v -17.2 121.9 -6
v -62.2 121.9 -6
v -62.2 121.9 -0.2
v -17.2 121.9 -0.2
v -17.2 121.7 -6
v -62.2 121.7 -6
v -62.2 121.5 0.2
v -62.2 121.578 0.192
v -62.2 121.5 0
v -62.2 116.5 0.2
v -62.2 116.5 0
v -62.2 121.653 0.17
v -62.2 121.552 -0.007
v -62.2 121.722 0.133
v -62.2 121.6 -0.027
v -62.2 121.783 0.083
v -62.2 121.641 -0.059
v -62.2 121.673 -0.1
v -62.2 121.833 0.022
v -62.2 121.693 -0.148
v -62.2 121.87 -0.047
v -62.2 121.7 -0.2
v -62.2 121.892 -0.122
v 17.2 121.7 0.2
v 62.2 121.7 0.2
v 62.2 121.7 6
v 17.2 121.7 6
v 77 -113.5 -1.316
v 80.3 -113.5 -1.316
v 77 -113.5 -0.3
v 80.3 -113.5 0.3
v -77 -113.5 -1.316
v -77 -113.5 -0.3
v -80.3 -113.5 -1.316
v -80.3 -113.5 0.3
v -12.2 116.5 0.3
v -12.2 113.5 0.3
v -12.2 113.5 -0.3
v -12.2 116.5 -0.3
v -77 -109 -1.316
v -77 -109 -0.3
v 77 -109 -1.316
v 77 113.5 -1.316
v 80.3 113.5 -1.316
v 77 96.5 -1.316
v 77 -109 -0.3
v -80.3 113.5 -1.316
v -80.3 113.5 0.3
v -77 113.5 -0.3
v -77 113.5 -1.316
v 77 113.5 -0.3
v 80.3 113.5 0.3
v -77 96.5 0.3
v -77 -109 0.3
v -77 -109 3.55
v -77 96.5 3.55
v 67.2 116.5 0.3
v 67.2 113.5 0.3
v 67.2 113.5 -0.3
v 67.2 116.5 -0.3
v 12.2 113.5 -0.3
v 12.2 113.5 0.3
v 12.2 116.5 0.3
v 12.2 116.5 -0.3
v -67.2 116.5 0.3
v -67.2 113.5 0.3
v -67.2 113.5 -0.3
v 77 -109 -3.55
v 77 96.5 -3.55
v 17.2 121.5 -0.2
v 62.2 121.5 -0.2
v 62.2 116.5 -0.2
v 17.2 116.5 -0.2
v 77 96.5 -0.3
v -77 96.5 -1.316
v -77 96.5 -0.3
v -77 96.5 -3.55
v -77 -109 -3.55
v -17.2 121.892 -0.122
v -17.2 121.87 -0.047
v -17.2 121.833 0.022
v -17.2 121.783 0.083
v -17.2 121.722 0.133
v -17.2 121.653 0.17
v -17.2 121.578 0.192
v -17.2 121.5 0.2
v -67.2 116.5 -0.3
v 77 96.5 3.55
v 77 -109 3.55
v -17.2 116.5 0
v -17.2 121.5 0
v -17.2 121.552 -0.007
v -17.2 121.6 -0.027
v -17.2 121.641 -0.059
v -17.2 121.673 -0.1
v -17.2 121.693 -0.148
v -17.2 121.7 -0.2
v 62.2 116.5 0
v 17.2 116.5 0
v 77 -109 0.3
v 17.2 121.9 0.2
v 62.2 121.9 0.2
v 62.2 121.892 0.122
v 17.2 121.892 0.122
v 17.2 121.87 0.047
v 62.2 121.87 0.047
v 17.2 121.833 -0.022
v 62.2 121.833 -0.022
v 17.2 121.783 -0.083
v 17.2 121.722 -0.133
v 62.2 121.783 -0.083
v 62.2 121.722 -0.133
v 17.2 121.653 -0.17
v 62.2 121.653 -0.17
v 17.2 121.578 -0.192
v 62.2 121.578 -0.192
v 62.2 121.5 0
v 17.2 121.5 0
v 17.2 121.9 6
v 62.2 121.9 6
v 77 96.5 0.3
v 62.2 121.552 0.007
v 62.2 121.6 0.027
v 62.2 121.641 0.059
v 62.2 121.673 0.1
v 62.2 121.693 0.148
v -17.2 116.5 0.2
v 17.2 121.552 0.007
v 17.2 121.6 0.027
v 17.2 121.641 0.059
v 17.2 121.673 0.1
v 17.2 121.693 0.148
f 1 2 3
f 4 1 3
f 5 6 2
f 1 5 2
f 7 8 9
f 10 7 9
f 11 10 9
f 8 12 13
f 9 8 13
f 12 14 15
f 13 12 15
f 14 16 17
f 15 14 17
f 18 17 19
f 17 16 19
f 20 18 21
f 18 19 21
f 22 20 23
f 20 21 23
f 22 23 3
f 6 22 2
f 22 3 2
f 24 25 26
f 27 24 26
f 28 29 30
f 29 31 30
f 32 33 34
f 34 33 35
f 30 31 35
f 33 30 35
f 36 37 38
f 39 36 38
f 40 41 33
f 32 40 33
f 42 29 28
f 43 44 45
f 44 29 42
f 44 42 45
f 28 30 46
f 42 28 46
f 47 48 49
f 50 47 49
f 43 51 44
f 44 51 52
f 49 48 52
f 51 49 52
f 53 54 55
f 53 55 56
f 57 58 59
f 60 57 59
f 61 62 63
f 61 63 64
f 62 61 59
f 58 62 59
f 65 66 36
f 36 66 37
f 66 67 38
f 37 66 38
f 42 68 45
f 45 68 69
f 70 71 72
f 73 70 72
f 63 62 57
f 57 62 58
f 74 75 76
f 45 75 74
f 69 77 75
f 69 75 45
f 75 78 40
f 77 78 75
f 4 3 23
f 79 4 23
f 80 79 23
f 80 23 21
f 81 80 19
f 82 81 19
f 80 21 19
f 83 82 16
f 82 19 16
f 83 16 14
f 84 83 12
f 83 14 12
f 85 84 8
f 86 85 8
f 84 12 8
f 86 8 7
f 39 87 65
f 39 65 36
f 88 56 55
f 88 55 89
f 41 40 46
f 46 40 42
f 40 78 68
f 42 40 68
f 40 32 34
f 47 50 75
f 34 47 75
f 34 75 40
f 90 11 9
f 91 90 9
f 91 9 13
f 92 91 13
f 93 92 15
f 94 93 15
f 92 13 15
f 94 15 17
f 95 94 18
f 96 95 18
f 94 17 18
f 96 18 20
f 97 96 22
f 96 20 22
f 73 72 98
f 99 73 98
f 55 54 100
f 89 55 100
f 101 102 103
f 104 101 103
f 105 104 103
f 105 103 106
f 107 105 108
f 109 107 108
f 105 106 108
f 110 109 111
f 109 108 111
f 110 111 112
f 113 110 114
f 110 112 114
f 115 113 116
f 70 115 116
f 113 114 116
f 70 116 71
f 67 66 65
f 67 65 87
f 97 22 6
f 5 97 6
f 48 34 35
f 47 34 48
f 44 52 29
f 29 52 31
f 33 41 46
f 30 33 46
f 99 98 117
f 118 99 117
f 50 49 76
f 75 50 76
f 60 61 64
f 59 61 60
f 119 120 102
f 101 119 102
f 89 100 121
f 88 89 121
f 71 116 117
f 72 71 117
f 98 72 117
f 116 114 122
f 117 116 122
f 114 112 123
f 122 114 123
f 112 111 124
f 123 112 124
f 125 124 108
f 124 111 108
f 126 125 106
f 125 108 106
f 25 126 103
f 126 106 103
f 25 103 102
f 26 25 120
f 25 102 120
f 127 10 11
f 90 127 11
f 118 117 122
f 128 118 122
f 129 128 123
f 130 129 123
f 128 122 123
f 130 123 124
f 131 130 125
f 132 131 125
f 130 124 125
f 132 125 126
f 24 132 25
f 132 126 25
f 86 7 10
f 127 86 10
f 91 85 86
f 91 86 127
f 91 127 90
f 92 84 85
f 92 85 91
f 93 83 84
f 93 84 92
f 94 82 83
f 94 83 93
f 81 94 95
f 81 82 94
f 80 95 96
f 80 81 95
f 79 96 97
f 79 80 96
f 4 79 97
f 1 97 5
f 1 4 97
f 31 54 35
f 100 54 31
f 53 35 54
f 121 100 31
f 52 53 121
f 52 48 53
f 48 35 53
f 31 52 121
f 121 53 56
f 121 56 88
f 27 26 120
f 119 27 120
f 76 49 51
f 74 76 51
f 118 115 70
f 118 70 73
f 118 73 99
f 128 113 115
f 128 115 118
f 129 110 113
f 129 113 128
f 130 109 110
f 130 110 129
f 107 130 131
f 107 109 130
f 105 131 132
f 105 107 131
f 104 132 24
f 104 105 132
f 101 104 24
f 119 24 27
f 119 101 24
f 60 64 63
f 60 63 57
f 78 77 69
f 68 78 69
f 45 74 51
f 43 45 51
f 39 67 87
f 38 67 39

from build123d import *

# Parameters (mm, degrees)
INSULATION_DEPTH      = 0.3
INSULATION_DEPTH_BACK = 0.3
SKETCH1_W             = 160.6
SKETCH1_H             = 227
MAIN_BODY_DEPTH       = 3.55
MAIN_BODY_DEPTH_BACK  = 3.55
SKETCH2_W             = 154
SKETCH2_H             = 205.5
SIDE_FOLDS_DEPTH      = 1.016
SKETCH114_W           = 55
SKETCH114_H           = 0.6
BOSS_EXTRUDE1_DEPTH   = 3
BOSS_EXTRUDE1_2_DEPTH = 3
BASE_FLANGE1_DEPTH    = 45
BASE_FLANGE2_DEPTH    = 45


# Sheet-metal steps are written as plain solids
with BuildPart() as part:
    # Sketch1 → Insulation (new, two sides: drawn at the far end of the back side and taken through both)
    with BuildSketch(Plane.XY.offset(-INSULATION_DEPTH_BACK)):
        Rectangle(SKETCH1_W, SKETCH1_H)
    extrude(amount=INSULATION_DEPTH + INSULATION_DEPTH_BACK)

    # Sketch2 → Main Body (add, two sides: drawn at the far end of the back side and taken through both)
    with BuildSketch(Plane.XY.offset(-MAIN_BODY_DEPTH_BACK)):
        with Locations((0, -6.25)):
            Rectangle(SKETCH2_W, SKETCH2_H)
    extrude(amount=MAIN_BODY_DEPTH + MAIN_BODY_DEPTH_BACK)

    # Sketch5 → Side Folds (add)
    with BuildSketch(Plane(origin=(0, 0, -0.3), x_dir=(-1, 0, 0), z_dir=(0, 0, -1))):
        Polygon((-77, -109), (-77, 96.5), (-77, 113.5), (-80.3, 113.5), (-80.3, -113.5), (-77, -113.5), align=None)
        Polygon((77, 113.5), (77, 96.5), (77, -109), (77, -113.5), (80.3, -113.5), (80.3, 113.5), align=None)
    extrude(amount=SIDE_FOLDS_DEPTH)


with BuildPart() as body_2:
    # Sketch114 → Boss-Extrude1 (new body)
    with BuildSketch(Plane(origin=(0, 113.5, 0), x_dir=(1, 0, 0), z_dir=(0, 1, 0))):
        with Locations((-39.7, 0)):
            Rectangle(SKETCH114_W, SKETCH114_H)
    extrude(amount=BOSS_EXTRUDE1_DEPTH)


with BuildPart() as body_3:
    # Sketch114 → Boss-Extrude1 2 (new body)
    with BuildSketch(Plane(origin=(0, 113.5, 0), x_dir=(1, 0, 0), z_dir=(0, 1, 0))):
        with Locations((39.7, 0)):
            Rectangle(SKETCH114_W, SKETCH114_H)
    extrude(amount=BOSS_EXTRUDE1_2_DEPTH)


with BuildPart() as body_4:
    # Sketch115 → Base-Flange1 (new body)
    with BuildSketch(Plane.ZY.offset(62.2)):
        with BuildLine():
            Line((0, 116.5), (0, 121.5))
            ThreePointArc((0, 121.5), (-0.058578644, 121.641421356), (-0.2, 121.7))
            Line((-0.2, 121.7), (-6, 121.7))
            Line((-6, 121.7), (-6, 121.9))
            Line((-6, 121.9), (-0.2, 121.9))
            ThreePointArc((-0.2, 121.9), (0.082842712, 121.782842712), (0.2, 121.5))
            Line((0.2, 121.5), (0.2, 116.5))
            Line((0.2, 116.5), (0, 116.5))
        make_face()
    extrude(amount=-BASE_FLANGE1_DEPTH)


with BuildPart() as body_5:
    # Sketch120 → Base-Flange2 (new body)
    with BuildSketch(Plane(origin=(62.2, 0, 0), x_dir=(0, 0, -1), z_dir=(1, 0, 0))):
        with BuildLine():
            Line((0, 116.5), (0, 121.5))
            ThreePointArc((0, 121.5), (-0.058578644, 121.641421356), (-0.2, 121.7))
            Line((-0.2, 121.7), (-6, 121.7))
            Line((-6, 121.7), (-6, 121.9))
            Line((-6, 121.9), (-0.2, 121.9))
            ThreePointArc((-0.2, 121.9), (0.082842712, 121.782842712), (0.2, 121.5))
            Line((0.2, 121.5), (0.2, 116.5))
            Line((0.2, 116.5), (0, 116.5))
        make_face()
    extrude(amount=-BASE_FLANGE2_DEPTH)


solid = Compound([part.part, body_2.part, body_3.part, body_4.part, body_5.part])
